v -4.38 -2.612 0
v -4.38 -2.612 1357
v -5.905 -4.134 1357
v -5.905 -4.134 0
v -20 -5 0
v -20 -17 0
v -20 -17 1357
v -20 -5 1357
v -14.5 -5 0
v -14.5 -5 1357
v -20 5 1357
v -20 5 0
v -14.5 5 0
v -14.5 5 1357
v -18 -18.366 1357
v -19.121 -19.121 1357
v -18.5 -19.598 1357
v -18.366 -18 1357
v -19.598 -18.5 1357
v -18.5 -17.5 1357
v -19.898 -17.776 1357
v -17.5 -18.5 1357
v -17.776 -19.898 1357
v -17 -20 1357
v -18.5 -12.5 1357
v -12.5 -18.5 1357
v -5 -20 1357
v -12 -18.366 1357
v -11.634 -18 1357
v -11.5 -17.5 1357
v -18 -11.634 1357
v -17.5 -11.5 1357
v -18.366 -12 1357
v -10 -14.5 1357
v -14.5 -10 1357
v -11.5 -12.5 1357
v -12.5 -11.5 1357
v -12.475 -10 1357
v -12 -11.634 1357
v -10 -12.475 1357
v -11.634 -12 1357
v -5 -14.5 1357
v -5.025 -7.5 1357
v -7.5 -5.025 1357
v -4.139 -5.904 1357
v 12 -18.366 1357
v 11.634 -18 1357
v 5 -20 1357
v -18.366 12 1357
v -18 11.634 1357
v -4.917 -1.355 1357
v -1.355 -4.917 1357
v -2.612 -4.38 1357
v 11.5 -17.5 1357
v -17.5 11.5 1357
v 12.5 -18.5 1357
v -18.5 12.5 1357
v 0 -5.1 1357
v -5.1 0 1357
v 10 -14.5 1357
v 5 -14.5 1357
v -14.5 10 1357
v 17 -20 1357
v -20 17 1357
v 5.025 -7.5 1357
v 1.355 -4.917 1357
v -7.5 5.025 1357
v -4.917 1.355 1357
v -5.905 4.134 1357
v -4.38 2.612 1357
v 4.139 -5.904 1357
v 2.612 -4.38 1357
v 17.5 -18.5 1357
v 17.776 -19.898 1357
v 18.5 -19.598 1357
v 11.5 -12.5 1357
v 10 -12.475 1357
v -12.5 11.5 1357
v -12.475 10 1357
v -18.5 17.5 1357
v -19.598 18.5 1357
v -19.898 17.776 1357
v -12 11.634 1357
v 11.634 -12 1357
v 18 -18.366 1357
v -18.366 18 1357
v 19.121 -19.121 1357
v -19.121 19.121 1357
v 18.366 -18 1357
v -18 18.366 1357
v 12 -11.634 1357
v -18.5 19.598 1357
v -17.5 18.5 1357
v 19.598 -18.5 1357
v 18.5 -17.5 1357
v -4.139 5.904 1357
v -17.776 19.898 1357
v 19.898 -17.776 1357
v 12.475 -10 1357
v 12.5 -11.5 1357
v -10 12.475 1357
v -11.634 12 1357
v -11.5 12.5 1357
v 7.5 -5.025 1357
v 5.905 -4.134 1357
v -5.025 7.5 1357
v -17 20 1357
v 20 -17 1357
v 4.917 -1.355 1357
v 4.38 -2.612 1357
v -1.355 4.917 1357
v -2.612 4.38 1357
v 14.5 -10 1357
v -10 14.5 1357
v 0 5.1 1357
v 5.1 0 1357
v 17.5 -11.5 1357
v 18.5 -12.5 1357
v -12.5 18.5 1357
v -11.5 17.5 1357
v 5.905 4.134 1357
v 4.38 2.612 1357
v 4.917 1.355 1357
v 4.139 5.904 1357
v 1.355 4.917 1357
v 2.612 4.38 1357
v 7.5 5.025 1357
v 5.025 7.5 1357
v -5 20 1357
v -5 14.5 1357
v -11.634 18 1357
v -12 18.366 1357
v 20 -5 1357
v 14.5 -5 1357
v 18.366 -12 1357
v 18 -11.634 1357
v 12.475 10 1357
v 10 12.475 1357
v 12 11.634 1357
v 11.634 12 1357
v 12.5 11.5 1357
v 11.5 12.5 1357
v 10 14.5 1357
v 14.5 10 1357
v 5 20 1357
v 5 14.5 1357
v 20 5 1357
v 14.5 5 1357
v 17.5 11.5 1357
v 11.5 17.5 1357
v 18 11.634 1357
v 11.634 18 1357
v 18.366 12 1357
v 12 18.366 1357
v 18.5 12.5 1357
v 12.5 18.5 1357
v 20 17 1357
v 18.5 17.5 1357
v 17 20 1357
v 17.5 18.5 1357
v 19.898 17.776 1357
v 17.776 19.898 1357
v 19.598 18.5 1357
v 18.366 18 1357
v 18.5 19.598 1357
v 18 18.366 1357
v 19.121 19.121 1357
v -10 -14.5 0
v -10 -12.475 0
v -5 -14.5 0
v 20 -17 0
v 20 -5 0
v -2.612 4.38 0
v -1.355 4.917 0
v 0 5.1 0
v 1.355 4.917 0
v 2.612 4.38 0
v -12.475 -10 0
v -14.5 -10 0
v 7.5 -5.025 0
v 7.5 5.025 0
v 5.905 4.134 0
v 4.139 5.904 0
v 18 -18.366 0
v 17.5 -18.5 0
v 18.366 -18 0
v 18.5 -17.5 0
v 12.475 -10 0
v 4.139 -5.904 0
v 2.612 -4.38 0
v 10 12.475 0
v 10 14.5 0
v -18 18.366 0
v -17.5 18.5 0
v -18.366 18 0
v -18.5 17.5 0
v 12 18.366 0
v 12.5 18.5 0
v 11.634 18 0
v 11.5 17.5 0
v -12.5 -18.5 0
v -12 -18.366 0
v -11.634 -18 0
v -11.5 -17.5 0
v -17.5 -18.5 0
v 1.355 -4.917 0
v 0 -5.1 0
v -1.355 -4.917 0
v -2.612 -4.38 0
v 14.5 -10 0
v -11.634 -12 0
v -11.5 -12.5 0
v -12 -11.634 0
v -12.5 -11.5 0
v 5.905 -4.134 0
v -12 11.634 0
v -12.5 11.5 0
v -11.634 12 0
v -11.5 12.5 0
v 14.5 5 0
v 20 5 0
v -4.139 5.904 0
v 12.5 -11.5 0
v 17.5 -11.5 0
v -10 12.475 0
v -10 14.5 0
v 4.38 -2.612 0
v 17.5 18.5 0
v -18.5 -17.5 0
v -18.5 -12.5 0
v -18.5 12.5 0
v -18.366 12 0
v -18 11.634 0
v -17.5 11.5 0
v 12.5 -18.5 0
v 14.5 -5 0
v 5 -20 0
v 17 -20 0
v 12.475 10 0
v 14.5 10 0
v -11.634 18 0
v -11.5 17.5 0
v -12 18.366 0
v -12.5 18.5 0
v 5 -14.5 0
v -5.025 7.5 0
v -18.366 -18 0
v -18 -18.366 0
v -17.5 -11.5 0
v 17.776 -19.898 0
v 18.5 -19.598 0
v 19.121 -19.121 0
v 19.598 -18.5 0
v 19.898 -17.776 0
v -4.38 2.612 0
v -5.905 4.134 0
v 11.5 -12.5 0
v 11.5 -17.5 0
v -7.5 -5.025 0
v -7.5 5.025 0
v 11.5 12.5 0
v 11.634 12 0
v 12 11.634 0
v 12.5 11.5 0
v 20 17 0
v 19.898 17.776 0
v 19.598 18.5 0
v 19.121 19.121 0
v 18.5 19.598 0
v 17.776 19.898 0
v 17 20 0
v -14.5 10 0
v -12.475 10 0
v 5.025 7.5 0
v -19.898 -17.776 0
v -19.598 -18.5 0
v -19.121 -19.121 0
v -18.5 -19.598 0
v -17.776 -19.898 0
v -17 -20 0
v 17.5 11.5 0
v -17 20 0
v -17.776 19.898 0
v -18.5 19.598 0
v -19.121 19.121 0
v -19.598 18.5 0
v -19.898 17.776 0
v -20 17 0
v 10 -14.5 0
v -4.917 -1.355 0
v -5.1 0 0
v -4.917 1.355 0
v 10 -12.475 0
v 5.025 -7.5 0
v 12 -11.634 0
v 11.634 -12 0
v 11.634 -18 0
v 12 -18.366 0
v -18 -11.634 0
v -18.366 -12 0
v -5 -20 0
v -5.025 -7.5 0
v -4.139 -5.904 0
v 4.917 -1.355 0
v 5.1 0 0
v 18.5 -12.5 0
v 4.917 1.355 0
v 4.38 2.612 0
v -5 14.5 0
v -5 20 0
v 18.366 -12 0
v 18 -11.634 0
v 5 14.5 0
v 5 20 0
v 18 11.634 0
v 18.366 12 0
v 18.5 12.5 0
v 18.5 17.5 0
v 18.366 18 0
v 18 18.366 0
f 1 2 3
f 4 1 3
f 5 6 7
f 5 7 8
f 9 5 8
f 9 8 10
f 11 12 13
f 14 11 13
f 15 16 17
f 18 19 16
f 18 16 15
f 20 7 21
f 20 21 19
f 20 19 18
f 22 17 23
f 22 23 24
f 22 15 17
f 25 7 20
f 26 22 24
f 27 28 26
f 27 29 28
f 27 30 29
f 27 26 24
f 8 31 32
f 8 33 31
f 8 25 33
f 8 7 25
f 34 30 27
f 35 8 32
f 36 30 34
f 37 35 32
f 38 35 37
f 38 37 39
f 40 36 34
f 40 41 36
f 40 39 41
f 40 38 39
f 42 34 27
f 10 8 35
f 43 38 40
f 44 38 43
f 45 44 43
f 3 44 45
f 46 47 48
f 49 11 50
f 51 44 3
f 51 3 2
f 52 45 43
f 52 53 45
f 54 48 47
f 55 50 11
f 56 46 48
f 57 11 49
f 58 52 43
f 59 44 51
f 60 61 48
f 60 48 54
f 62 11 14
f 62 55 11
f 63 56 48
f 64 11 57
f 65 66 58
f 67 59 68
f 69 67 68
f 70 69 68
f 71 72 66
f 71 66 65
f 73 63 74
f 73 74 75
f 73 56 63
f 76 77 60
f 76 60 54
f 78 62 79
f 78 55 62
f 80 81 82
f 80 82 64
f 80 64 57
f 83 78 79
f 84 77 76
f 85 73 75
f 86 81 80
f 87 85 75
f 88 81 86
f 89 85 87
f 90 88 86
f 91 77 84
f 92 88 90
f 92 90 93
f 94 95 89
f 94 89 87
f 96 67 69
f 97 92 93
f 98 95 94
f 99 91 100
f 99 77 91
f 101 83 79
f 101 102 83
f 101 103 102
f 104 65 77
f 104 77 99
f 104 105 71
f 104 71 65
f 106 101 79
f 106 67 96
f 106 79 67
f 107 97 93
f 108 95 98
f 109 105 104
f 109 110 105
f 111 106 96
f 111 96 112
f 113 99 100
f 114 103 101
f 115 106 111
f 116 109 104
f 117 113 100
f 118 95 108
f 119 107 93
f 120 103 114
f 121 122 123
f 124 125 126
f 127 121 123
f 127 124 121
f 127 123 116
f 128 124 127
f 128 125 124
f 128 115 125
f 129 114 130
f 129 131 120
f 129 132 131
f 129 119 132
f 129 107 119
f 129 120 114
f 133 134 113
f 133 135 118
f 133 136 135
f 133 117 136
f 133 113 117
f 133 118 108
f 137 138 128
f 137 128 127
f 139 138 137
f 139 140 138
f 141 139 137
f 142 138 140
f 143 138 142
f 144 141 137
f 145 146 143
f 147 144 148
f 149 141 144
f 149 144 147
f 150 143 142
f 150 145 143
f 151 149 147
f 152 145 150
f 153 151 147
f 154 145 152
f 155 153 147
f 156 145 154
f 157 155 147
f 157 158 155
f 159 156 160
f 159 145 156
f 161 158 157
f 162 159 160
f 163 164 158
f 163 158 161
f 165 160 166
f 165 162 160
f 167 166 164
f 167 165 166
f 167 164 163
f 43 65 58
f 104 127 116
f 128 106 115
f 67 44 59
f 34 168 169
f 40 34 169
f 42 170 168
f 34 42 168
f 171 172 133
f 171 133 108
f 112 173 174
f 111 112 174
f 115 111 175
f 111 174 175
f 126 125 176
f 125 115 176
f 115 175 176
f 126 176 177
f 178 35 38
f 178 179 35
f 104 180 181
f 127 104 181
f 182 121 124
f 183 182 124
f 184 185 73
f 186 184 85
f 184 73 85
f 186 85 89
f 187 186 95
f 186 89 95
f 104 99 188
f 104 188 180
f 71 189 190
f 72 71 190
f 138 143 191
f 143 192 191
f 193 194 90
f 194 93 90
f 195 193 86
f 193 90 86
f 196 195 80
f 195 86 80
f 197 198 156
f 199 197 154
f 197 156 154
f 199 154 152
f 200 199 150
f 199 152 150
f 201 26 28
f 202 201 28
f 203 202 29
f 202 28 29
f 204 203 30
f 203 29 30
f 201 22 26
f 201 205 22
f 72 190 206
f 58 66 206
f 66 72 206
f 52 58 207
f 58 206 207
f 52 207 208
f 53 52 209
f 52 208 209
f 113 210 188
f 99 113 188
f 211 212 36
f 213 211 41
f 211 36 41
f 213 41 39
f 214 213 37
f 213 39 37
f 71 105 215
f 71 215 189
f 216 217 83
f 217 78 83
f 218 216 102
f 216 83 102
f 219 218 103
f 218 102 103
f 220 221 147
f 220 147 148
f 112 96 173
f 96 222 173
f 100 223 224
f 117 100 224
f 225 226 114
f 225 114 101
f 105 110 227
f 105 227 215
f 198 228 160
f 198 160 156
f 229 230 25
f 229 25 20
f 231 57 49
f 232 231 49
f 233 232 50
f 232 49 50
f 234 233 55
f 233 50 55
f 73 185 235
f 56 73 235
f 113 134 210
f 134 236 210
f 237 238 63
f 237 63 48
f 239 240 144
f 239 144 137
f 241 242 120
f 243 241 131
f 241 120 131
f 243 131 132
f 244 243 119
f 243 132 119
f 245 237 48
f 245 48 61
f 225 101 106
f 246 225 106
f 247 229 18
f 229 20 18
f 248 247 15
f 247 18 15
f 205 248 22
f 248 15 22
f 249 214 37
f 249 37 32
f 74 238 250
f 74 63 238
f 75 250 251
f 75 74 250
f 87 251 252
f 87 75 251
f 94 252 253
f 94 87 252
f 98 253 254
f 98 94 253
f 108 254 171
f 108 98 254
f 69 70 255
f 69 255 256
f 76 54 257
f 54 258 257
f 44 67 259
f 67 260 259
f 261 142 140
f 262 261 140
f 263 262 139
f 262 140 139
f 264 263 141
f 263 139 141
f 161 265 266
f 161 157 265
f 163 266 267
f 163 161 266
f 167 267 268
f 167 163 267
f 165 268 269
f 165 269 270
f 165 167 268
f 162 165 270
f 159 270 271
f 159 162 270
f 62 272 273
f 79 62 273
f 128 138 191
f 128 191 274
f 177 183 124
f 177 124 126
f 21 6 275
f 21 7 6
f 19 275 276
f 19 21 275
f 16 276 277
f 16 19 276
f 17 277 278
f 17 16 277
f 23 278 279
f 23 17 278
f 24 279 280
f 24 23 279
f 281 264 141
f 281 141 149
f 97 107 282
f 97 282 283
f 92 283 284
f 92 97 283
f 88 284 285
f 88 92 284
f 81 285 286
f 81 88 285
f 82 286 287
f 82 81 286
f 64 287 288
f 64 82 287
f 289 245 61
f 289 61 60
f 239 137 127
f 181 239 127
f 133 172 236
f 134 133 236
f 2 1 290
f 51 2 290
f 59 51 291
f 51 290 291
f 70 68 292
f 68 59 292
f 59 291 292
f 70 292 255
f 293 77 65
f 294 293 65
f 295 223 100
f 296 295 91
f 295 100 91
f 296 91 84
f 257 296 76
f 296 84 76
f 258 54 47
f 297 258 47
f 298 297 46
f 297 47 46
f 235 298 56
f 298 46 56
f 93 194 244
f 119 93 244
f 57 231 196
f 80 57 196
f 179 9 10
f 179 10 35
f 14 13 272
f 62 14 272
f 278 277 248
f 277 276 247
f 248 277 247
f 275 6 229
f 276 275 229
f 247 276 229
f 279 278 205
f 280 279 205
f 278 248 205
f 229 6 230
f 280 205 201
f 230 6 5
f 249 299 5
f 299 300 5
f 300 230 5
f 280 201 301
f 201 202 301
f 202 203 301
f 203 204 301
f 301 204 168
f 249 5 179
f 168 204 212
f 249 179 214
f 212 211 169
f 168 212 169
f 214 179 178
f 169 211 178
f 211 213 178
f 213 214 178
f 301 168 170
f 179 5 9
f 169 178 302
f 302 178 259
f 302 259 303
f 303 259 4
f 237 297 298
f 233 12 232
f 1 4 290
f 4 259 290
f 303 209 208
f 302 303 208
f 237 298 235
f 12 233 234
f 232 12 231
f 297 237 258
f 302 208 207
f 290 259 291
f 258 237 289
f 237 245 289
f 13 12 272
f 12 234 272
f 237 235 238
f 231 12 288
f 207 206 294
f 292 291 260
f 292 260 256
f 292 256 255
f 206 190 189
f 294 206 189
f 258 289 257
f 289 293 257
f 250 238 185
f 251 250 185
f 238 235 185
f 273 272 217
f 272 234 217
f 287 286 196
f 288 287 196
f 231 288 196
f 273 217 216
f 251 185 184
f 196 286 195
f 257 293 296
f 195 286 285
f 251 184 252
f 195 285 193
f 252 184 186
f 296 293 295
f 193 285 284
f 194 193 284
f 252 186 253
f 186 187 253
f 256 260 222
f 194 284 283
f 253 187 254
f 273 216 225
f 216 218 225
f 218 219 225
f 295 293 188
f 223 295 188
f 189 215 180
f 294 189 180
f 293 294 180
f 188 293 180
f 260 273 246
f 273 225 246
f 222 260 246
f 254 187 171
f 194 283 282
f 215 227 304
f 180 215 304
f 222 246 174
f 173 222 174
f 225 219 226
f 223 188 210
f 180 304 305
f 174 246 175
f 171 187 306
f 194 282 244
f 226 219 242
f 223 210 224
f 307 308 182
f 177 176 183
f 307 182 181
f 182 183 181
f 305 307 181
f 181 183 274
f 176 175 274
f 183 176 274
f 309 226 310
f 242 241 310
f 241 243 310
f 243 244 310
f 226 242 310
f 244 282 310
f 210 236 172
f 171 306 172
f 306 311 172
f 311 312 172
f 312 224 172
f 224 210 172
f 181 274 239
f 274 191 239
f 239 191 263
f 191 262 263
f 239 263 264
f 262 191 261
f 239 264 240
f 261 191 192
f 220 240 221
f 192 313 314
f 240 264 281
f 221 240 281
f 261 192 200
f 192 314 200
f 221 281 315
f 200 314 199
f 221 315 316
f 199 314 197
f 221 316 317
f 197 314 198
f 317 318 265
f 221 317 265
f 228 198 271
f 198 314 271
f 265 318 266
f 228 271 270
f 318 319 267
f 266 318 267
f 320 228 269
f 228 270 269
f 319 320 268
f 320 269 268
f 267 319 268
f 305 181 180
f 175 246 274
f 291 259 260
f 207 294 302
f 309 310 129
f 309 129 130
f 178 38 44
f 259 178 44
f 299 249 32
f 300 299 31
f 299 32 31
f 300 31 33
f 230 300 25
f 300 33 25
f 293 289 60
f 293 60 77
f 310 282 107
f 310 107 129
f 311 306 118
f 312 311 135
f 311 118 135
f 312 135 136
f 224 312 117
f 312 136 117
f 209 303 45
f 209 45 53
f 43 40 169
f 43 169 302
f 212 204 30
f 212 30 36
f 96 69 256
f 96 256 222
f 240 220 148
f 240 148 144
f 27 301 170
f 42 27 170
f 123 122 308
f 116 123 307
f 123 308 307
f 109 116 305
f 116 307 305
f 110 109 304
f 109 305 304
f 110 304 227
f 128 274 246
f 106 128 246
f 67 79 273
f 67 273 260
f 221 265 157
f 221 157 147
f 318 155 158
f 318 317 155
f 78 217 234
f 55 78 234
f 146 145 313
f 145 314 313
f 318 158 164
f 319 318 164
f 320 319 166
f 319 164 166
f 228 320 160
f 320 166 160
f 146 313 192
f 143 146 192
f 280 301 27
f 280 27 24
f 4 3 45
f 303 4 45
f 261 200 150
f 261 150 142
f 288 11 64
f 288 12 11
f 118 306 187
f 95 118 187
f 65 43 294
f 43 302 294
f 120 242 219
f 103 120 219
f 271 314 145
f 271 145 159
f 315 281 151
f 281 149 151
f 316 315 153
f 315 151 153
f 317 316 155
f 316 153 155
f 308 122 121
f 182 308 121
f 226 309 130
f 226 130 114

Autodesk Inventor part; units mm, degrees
ref_plane "YZ Plane" through (0, 0, 0) normal (1, 0, 0) x (0, 1, 0)
ref_plane "XZ Plane" through (0, 0, 0) normal (0, 1, 0) x (-1, 0, 0)
ref_plane "XY Plane" through (0, 0, 0) normal (0, 0, 1) x (1, 0, 0)
sketch "T-Slot 4040 Base" plane through (0, 0, 0) normal (0, 0, 1) x (1, 0, 0)
  line L0 (-28, 0) -> (28, 0) construction
  line L1 (0, -28) -> (0, 28) construction
  circle A0 centre (0, 0) radius 5.1
  line L2 (-7.5, -7.5) -> (7.5, -7.5)
  line L3 (7.5, -7.5) -> (7.5, 7.5)
  line L4 (7.5, 7.5) -> (-7.5, 7.5)
  line L5 (-7.5, 7.5) -> (-7.5, -7.5)
  line L6 (-7.5, -7.5) -> (7.5, 7.5) construction
  line L7 (7.5, -7.5) -> (-7.5, 7.5) construction
  line L8 (-20, 20) -> (20, 20)
  line L9 (20, 20) -> (20, -20)
  line L10 (20, -20) -> (-20, -20)
  line L11 (-20, -20) -> (-20, 20)
  line L12 (-20, 20) -> (20, -20) construction
  line L13 (20, 20) -> (-20, -20) construction
  line L14 (20, 5) -> (14.5, 5)
  line L15 (14.5, 5) -> (14.5, 10)
  line L16 (14.5, 10) -> (12.4749, 10)
  line L17 (12.4749, 10) -> (7.5, 5.0251)
  line L18 (5, 20) -> (5, 14.5)
  line L19 (5, 14.5) -> (10, 14.5)
  line L20 (10, 14.5) -> (10, 12.4749)
  line L21 (10, 12.4749) -> (5.0251, 7.5)
  line L22 (18.5, 18.5) -> (11.5, 18.5)
  line L23 (11.5, 18.5) -> (11.5, 11.5)
  line L24 (11.5, 11.5) -> (18.5, 11.5)
  line L25 (18.5, 11.5) -> (18.5, 18.5)
  line L26 (18.5, 18.5) -> (11.5, 11.5) construction
  line L27 (11.5, 18.5) -> (18.5, 11.5) construction
  line L28 (3.0732, 1.3088) -> (4.38, 2.6125) construction
  line L29 (5.905, 4.1338) -> (4.1393, 5.9037)
  line L30 (4.1393, 5.9037) -> (2.6122, 4.3802)
  line L31 (1.3075, 3.0787) -> (3.0732, 1.3088) construction
  line L32 (3.0732, 1.3088) -> (4.1393, 5.9037) construction
  line L33 (5.905, 4.1338) -> (1.3075, 3.0787) construction
  line L34 (4.38, 2.6125) -> (5.905, 4.1338)
  line L35 (2.6122, 4.3802) -> (1.3075, 3.0787) construction
  line L36 (-20, 5) -> (-14.5, 5)
  line L37 (-14.5, 5) -> (-14.5, 10)
  line L38 (-14.5, 10) -> (-12.4749, 10)
  line L39 (-12.4749, 10) -> (-7.5, 5.0251)
  line L40 (-5, 20) -> (-5, 14.5)
  line L41 (-5, 14.5) -> (-10, 14.5)
  line L42 (-10, 14.5) -> (-10, 12.4749)
  line L43 (-10, 12.4749) -> (-5.0251, 7.5)
  line L44 (-18.5, 18.5) -> (-11.5, 18.5)
  line L45 (-11.5, 18.5) -> (-11.5, 11.5)
  line L46 (-11.5, 11.5) -> (-18.5, 11.5)
  line L47 (-18.5, 11.5) -> (-18.5, 18.5)
  line L48 (-5.905, 4.1338) -> (-4.1393, 5.9037)
  line L49 (-4.1393, 5.9037) -> (-2.6122, 4.3802)
  line L50 (-4.38, 2.6125) -> (-5.905, 4.1338)
  line L51 (7.5, -7.5) -> (-7.5, -7.5)
  line L52 (20, -5) -> (14.5, -5)
  line L53 (14.5, -5) -> (14.5, -10)
  line L54 (14.5, -10) -> (12.4749, -10)
  line L55 (12.4749, -10) -> (7.5, -5.0251)
  line L56 (5, -20) -> (5, -14.5)
  line L57 (5, -14.5) -> (10, -14.5)
  line L58 (10, -14.5) -> (10, -12.4749)
  line L59 (10, -12.4749) -> (5.0251, -7.5)
  line L60 (18.5, -18.5) -> (11.5, -18.5)
  line L61 (11.5, -18.5) -> (11.5, -11.5)
  line L62 (11.5, -11.5) -> (18.5, -11.5)
  line L63 (18.5, -11.5) -> (18.5, -18.5)
  line L64 (18.5, -18.5) -> (11.5, -11.5) construction
  line L65 (11.5, -18.5) -> (18.5, -11.5) construction
  line L66 (3.0732, -1.3088) -> (4.38, -2.6125) construction
  line L67 (5.905, -4.1338) -> (4.1393, -5.9037)
  line L68 (4.1393, -5.9037) -> (2.6122, -4.3802)
  line L69 (1.3075, -3.0787) -> (3.0732, -1.3088) construction
  line L70 (3.0732, -1.3088) -> (4.1393, -5.9037) construction
  line L71 (5.905, -4.1338) -> (1.3075, -3.0787) construction
  line L72 (4.38, -2.6125) -> (5.905, -4.1338)
  line L73 (2.6122, -4.3802) -> (1.3075, -3.0787) construction
  line L74 (-4.38, -2.6125) -> (-5.905, -4.1338)
  line L75 (-4.1393, -5.9037) -> (-2.6122, -4.3802)
  line L76 (-5.905, -4.1338) -> (-4.1393, -5.9037)
  line L77 (-12.4749, -10) -> (-7.5, -5.0251)
  line L78 (-10, -12.4749) -> (-5.0251, -7.5)
  line L79 (-10, -14.5) -> (-10, -12.4749)
  line L80 (-5, -14.5) -> (-10, -14.5)
  line L81 (-5, -20) -> (-5, -14.5)
  line L82 (-18.5, -18.5) -> (-11.5, -18.5)
  line L83 (-11.5, -18.5) -> (-11.5, -11.5)
  line L84 (-11.5, -11.5) -> (-18.5, -11.5)
  line L85 (-18.5, -11.5) -> (-18.5, -18.5)
  line L86 (-14.5, -10) -> (-12.4749, -10)
  line L87 (-14.5, -5) -> (-14.5, -10)
  line L88 (-20, -5) -> (-14.5, -5)
  point P0 (15, 15)
  point P1 (3.6062, 3.6062)
  point P2 (3.6062, 3.6062)
  point P3 (15, -15)
  point P4 (3.6062, -3.6062)
  point P5 (3.6062, -3.6062)
  dimension "d9" = 10.2
  dimension "d12" = 40
  dimension "d13" = 40
  dimension "d14" = 5.5
  dimension "d15" = 15
  dimension "d16" = 7
  dimension "d17" = 10
  dimension "d20" = 1.75
  dimension "d21" = 7
  dimension "d22" = 2
  dimension "d29" = 1.5
  dimension "d30" = 2.5
extrude "Extrusion1" add sketch "T-Slot 4040 Base" along normal blind 1357 contours L5 L4 L3 L2 | L2 L78 L79 L80 L81 L10 L11 L88 L87 L86 L77 L5 | L2 L3 L55 L54 L53 L52 L9 L10 L56 L57 L58 L59 | L39 L38 L37 L36 L11 L8 L40 L41 L42 L43 L4 L5 | L3 L4 L21 L20 L19 L18 L8 L9 L14 L15 L16 L17
fillet "Rundung1" radius 1 16 edges at (11.5, 18.5, 678.5) (18.5, 18.5, 678.5) (18.5, 11.5, 678.5) (11.5, 11.5, 678.5) (-11.5, 18.5, 678.5) (-18.5, 18.5, 678.5) (-18.5, 11.5, 678.5) (-11.5, 11.5, 678.5) (-18.5, -11.5, 678.5) (-11.5, -11.5, 678.5) (-11.5, -18.5, 678.5) (-18.5, -18.5, 678.5) (11.5, -18.5, 678.5) (11.5, -11.5, 678.5) (18.5, -11.5, 678.5) (18.5, -18.5, 678.5)
fillet "Rundung2" radius 3 4 edges at (20, 20, 678.5) (20, -20, 678.5) (-20, -20, 678.5) (-20, 20, 678.5)
properties part number "T-SLOT 4040 B-Type 1357mm"
